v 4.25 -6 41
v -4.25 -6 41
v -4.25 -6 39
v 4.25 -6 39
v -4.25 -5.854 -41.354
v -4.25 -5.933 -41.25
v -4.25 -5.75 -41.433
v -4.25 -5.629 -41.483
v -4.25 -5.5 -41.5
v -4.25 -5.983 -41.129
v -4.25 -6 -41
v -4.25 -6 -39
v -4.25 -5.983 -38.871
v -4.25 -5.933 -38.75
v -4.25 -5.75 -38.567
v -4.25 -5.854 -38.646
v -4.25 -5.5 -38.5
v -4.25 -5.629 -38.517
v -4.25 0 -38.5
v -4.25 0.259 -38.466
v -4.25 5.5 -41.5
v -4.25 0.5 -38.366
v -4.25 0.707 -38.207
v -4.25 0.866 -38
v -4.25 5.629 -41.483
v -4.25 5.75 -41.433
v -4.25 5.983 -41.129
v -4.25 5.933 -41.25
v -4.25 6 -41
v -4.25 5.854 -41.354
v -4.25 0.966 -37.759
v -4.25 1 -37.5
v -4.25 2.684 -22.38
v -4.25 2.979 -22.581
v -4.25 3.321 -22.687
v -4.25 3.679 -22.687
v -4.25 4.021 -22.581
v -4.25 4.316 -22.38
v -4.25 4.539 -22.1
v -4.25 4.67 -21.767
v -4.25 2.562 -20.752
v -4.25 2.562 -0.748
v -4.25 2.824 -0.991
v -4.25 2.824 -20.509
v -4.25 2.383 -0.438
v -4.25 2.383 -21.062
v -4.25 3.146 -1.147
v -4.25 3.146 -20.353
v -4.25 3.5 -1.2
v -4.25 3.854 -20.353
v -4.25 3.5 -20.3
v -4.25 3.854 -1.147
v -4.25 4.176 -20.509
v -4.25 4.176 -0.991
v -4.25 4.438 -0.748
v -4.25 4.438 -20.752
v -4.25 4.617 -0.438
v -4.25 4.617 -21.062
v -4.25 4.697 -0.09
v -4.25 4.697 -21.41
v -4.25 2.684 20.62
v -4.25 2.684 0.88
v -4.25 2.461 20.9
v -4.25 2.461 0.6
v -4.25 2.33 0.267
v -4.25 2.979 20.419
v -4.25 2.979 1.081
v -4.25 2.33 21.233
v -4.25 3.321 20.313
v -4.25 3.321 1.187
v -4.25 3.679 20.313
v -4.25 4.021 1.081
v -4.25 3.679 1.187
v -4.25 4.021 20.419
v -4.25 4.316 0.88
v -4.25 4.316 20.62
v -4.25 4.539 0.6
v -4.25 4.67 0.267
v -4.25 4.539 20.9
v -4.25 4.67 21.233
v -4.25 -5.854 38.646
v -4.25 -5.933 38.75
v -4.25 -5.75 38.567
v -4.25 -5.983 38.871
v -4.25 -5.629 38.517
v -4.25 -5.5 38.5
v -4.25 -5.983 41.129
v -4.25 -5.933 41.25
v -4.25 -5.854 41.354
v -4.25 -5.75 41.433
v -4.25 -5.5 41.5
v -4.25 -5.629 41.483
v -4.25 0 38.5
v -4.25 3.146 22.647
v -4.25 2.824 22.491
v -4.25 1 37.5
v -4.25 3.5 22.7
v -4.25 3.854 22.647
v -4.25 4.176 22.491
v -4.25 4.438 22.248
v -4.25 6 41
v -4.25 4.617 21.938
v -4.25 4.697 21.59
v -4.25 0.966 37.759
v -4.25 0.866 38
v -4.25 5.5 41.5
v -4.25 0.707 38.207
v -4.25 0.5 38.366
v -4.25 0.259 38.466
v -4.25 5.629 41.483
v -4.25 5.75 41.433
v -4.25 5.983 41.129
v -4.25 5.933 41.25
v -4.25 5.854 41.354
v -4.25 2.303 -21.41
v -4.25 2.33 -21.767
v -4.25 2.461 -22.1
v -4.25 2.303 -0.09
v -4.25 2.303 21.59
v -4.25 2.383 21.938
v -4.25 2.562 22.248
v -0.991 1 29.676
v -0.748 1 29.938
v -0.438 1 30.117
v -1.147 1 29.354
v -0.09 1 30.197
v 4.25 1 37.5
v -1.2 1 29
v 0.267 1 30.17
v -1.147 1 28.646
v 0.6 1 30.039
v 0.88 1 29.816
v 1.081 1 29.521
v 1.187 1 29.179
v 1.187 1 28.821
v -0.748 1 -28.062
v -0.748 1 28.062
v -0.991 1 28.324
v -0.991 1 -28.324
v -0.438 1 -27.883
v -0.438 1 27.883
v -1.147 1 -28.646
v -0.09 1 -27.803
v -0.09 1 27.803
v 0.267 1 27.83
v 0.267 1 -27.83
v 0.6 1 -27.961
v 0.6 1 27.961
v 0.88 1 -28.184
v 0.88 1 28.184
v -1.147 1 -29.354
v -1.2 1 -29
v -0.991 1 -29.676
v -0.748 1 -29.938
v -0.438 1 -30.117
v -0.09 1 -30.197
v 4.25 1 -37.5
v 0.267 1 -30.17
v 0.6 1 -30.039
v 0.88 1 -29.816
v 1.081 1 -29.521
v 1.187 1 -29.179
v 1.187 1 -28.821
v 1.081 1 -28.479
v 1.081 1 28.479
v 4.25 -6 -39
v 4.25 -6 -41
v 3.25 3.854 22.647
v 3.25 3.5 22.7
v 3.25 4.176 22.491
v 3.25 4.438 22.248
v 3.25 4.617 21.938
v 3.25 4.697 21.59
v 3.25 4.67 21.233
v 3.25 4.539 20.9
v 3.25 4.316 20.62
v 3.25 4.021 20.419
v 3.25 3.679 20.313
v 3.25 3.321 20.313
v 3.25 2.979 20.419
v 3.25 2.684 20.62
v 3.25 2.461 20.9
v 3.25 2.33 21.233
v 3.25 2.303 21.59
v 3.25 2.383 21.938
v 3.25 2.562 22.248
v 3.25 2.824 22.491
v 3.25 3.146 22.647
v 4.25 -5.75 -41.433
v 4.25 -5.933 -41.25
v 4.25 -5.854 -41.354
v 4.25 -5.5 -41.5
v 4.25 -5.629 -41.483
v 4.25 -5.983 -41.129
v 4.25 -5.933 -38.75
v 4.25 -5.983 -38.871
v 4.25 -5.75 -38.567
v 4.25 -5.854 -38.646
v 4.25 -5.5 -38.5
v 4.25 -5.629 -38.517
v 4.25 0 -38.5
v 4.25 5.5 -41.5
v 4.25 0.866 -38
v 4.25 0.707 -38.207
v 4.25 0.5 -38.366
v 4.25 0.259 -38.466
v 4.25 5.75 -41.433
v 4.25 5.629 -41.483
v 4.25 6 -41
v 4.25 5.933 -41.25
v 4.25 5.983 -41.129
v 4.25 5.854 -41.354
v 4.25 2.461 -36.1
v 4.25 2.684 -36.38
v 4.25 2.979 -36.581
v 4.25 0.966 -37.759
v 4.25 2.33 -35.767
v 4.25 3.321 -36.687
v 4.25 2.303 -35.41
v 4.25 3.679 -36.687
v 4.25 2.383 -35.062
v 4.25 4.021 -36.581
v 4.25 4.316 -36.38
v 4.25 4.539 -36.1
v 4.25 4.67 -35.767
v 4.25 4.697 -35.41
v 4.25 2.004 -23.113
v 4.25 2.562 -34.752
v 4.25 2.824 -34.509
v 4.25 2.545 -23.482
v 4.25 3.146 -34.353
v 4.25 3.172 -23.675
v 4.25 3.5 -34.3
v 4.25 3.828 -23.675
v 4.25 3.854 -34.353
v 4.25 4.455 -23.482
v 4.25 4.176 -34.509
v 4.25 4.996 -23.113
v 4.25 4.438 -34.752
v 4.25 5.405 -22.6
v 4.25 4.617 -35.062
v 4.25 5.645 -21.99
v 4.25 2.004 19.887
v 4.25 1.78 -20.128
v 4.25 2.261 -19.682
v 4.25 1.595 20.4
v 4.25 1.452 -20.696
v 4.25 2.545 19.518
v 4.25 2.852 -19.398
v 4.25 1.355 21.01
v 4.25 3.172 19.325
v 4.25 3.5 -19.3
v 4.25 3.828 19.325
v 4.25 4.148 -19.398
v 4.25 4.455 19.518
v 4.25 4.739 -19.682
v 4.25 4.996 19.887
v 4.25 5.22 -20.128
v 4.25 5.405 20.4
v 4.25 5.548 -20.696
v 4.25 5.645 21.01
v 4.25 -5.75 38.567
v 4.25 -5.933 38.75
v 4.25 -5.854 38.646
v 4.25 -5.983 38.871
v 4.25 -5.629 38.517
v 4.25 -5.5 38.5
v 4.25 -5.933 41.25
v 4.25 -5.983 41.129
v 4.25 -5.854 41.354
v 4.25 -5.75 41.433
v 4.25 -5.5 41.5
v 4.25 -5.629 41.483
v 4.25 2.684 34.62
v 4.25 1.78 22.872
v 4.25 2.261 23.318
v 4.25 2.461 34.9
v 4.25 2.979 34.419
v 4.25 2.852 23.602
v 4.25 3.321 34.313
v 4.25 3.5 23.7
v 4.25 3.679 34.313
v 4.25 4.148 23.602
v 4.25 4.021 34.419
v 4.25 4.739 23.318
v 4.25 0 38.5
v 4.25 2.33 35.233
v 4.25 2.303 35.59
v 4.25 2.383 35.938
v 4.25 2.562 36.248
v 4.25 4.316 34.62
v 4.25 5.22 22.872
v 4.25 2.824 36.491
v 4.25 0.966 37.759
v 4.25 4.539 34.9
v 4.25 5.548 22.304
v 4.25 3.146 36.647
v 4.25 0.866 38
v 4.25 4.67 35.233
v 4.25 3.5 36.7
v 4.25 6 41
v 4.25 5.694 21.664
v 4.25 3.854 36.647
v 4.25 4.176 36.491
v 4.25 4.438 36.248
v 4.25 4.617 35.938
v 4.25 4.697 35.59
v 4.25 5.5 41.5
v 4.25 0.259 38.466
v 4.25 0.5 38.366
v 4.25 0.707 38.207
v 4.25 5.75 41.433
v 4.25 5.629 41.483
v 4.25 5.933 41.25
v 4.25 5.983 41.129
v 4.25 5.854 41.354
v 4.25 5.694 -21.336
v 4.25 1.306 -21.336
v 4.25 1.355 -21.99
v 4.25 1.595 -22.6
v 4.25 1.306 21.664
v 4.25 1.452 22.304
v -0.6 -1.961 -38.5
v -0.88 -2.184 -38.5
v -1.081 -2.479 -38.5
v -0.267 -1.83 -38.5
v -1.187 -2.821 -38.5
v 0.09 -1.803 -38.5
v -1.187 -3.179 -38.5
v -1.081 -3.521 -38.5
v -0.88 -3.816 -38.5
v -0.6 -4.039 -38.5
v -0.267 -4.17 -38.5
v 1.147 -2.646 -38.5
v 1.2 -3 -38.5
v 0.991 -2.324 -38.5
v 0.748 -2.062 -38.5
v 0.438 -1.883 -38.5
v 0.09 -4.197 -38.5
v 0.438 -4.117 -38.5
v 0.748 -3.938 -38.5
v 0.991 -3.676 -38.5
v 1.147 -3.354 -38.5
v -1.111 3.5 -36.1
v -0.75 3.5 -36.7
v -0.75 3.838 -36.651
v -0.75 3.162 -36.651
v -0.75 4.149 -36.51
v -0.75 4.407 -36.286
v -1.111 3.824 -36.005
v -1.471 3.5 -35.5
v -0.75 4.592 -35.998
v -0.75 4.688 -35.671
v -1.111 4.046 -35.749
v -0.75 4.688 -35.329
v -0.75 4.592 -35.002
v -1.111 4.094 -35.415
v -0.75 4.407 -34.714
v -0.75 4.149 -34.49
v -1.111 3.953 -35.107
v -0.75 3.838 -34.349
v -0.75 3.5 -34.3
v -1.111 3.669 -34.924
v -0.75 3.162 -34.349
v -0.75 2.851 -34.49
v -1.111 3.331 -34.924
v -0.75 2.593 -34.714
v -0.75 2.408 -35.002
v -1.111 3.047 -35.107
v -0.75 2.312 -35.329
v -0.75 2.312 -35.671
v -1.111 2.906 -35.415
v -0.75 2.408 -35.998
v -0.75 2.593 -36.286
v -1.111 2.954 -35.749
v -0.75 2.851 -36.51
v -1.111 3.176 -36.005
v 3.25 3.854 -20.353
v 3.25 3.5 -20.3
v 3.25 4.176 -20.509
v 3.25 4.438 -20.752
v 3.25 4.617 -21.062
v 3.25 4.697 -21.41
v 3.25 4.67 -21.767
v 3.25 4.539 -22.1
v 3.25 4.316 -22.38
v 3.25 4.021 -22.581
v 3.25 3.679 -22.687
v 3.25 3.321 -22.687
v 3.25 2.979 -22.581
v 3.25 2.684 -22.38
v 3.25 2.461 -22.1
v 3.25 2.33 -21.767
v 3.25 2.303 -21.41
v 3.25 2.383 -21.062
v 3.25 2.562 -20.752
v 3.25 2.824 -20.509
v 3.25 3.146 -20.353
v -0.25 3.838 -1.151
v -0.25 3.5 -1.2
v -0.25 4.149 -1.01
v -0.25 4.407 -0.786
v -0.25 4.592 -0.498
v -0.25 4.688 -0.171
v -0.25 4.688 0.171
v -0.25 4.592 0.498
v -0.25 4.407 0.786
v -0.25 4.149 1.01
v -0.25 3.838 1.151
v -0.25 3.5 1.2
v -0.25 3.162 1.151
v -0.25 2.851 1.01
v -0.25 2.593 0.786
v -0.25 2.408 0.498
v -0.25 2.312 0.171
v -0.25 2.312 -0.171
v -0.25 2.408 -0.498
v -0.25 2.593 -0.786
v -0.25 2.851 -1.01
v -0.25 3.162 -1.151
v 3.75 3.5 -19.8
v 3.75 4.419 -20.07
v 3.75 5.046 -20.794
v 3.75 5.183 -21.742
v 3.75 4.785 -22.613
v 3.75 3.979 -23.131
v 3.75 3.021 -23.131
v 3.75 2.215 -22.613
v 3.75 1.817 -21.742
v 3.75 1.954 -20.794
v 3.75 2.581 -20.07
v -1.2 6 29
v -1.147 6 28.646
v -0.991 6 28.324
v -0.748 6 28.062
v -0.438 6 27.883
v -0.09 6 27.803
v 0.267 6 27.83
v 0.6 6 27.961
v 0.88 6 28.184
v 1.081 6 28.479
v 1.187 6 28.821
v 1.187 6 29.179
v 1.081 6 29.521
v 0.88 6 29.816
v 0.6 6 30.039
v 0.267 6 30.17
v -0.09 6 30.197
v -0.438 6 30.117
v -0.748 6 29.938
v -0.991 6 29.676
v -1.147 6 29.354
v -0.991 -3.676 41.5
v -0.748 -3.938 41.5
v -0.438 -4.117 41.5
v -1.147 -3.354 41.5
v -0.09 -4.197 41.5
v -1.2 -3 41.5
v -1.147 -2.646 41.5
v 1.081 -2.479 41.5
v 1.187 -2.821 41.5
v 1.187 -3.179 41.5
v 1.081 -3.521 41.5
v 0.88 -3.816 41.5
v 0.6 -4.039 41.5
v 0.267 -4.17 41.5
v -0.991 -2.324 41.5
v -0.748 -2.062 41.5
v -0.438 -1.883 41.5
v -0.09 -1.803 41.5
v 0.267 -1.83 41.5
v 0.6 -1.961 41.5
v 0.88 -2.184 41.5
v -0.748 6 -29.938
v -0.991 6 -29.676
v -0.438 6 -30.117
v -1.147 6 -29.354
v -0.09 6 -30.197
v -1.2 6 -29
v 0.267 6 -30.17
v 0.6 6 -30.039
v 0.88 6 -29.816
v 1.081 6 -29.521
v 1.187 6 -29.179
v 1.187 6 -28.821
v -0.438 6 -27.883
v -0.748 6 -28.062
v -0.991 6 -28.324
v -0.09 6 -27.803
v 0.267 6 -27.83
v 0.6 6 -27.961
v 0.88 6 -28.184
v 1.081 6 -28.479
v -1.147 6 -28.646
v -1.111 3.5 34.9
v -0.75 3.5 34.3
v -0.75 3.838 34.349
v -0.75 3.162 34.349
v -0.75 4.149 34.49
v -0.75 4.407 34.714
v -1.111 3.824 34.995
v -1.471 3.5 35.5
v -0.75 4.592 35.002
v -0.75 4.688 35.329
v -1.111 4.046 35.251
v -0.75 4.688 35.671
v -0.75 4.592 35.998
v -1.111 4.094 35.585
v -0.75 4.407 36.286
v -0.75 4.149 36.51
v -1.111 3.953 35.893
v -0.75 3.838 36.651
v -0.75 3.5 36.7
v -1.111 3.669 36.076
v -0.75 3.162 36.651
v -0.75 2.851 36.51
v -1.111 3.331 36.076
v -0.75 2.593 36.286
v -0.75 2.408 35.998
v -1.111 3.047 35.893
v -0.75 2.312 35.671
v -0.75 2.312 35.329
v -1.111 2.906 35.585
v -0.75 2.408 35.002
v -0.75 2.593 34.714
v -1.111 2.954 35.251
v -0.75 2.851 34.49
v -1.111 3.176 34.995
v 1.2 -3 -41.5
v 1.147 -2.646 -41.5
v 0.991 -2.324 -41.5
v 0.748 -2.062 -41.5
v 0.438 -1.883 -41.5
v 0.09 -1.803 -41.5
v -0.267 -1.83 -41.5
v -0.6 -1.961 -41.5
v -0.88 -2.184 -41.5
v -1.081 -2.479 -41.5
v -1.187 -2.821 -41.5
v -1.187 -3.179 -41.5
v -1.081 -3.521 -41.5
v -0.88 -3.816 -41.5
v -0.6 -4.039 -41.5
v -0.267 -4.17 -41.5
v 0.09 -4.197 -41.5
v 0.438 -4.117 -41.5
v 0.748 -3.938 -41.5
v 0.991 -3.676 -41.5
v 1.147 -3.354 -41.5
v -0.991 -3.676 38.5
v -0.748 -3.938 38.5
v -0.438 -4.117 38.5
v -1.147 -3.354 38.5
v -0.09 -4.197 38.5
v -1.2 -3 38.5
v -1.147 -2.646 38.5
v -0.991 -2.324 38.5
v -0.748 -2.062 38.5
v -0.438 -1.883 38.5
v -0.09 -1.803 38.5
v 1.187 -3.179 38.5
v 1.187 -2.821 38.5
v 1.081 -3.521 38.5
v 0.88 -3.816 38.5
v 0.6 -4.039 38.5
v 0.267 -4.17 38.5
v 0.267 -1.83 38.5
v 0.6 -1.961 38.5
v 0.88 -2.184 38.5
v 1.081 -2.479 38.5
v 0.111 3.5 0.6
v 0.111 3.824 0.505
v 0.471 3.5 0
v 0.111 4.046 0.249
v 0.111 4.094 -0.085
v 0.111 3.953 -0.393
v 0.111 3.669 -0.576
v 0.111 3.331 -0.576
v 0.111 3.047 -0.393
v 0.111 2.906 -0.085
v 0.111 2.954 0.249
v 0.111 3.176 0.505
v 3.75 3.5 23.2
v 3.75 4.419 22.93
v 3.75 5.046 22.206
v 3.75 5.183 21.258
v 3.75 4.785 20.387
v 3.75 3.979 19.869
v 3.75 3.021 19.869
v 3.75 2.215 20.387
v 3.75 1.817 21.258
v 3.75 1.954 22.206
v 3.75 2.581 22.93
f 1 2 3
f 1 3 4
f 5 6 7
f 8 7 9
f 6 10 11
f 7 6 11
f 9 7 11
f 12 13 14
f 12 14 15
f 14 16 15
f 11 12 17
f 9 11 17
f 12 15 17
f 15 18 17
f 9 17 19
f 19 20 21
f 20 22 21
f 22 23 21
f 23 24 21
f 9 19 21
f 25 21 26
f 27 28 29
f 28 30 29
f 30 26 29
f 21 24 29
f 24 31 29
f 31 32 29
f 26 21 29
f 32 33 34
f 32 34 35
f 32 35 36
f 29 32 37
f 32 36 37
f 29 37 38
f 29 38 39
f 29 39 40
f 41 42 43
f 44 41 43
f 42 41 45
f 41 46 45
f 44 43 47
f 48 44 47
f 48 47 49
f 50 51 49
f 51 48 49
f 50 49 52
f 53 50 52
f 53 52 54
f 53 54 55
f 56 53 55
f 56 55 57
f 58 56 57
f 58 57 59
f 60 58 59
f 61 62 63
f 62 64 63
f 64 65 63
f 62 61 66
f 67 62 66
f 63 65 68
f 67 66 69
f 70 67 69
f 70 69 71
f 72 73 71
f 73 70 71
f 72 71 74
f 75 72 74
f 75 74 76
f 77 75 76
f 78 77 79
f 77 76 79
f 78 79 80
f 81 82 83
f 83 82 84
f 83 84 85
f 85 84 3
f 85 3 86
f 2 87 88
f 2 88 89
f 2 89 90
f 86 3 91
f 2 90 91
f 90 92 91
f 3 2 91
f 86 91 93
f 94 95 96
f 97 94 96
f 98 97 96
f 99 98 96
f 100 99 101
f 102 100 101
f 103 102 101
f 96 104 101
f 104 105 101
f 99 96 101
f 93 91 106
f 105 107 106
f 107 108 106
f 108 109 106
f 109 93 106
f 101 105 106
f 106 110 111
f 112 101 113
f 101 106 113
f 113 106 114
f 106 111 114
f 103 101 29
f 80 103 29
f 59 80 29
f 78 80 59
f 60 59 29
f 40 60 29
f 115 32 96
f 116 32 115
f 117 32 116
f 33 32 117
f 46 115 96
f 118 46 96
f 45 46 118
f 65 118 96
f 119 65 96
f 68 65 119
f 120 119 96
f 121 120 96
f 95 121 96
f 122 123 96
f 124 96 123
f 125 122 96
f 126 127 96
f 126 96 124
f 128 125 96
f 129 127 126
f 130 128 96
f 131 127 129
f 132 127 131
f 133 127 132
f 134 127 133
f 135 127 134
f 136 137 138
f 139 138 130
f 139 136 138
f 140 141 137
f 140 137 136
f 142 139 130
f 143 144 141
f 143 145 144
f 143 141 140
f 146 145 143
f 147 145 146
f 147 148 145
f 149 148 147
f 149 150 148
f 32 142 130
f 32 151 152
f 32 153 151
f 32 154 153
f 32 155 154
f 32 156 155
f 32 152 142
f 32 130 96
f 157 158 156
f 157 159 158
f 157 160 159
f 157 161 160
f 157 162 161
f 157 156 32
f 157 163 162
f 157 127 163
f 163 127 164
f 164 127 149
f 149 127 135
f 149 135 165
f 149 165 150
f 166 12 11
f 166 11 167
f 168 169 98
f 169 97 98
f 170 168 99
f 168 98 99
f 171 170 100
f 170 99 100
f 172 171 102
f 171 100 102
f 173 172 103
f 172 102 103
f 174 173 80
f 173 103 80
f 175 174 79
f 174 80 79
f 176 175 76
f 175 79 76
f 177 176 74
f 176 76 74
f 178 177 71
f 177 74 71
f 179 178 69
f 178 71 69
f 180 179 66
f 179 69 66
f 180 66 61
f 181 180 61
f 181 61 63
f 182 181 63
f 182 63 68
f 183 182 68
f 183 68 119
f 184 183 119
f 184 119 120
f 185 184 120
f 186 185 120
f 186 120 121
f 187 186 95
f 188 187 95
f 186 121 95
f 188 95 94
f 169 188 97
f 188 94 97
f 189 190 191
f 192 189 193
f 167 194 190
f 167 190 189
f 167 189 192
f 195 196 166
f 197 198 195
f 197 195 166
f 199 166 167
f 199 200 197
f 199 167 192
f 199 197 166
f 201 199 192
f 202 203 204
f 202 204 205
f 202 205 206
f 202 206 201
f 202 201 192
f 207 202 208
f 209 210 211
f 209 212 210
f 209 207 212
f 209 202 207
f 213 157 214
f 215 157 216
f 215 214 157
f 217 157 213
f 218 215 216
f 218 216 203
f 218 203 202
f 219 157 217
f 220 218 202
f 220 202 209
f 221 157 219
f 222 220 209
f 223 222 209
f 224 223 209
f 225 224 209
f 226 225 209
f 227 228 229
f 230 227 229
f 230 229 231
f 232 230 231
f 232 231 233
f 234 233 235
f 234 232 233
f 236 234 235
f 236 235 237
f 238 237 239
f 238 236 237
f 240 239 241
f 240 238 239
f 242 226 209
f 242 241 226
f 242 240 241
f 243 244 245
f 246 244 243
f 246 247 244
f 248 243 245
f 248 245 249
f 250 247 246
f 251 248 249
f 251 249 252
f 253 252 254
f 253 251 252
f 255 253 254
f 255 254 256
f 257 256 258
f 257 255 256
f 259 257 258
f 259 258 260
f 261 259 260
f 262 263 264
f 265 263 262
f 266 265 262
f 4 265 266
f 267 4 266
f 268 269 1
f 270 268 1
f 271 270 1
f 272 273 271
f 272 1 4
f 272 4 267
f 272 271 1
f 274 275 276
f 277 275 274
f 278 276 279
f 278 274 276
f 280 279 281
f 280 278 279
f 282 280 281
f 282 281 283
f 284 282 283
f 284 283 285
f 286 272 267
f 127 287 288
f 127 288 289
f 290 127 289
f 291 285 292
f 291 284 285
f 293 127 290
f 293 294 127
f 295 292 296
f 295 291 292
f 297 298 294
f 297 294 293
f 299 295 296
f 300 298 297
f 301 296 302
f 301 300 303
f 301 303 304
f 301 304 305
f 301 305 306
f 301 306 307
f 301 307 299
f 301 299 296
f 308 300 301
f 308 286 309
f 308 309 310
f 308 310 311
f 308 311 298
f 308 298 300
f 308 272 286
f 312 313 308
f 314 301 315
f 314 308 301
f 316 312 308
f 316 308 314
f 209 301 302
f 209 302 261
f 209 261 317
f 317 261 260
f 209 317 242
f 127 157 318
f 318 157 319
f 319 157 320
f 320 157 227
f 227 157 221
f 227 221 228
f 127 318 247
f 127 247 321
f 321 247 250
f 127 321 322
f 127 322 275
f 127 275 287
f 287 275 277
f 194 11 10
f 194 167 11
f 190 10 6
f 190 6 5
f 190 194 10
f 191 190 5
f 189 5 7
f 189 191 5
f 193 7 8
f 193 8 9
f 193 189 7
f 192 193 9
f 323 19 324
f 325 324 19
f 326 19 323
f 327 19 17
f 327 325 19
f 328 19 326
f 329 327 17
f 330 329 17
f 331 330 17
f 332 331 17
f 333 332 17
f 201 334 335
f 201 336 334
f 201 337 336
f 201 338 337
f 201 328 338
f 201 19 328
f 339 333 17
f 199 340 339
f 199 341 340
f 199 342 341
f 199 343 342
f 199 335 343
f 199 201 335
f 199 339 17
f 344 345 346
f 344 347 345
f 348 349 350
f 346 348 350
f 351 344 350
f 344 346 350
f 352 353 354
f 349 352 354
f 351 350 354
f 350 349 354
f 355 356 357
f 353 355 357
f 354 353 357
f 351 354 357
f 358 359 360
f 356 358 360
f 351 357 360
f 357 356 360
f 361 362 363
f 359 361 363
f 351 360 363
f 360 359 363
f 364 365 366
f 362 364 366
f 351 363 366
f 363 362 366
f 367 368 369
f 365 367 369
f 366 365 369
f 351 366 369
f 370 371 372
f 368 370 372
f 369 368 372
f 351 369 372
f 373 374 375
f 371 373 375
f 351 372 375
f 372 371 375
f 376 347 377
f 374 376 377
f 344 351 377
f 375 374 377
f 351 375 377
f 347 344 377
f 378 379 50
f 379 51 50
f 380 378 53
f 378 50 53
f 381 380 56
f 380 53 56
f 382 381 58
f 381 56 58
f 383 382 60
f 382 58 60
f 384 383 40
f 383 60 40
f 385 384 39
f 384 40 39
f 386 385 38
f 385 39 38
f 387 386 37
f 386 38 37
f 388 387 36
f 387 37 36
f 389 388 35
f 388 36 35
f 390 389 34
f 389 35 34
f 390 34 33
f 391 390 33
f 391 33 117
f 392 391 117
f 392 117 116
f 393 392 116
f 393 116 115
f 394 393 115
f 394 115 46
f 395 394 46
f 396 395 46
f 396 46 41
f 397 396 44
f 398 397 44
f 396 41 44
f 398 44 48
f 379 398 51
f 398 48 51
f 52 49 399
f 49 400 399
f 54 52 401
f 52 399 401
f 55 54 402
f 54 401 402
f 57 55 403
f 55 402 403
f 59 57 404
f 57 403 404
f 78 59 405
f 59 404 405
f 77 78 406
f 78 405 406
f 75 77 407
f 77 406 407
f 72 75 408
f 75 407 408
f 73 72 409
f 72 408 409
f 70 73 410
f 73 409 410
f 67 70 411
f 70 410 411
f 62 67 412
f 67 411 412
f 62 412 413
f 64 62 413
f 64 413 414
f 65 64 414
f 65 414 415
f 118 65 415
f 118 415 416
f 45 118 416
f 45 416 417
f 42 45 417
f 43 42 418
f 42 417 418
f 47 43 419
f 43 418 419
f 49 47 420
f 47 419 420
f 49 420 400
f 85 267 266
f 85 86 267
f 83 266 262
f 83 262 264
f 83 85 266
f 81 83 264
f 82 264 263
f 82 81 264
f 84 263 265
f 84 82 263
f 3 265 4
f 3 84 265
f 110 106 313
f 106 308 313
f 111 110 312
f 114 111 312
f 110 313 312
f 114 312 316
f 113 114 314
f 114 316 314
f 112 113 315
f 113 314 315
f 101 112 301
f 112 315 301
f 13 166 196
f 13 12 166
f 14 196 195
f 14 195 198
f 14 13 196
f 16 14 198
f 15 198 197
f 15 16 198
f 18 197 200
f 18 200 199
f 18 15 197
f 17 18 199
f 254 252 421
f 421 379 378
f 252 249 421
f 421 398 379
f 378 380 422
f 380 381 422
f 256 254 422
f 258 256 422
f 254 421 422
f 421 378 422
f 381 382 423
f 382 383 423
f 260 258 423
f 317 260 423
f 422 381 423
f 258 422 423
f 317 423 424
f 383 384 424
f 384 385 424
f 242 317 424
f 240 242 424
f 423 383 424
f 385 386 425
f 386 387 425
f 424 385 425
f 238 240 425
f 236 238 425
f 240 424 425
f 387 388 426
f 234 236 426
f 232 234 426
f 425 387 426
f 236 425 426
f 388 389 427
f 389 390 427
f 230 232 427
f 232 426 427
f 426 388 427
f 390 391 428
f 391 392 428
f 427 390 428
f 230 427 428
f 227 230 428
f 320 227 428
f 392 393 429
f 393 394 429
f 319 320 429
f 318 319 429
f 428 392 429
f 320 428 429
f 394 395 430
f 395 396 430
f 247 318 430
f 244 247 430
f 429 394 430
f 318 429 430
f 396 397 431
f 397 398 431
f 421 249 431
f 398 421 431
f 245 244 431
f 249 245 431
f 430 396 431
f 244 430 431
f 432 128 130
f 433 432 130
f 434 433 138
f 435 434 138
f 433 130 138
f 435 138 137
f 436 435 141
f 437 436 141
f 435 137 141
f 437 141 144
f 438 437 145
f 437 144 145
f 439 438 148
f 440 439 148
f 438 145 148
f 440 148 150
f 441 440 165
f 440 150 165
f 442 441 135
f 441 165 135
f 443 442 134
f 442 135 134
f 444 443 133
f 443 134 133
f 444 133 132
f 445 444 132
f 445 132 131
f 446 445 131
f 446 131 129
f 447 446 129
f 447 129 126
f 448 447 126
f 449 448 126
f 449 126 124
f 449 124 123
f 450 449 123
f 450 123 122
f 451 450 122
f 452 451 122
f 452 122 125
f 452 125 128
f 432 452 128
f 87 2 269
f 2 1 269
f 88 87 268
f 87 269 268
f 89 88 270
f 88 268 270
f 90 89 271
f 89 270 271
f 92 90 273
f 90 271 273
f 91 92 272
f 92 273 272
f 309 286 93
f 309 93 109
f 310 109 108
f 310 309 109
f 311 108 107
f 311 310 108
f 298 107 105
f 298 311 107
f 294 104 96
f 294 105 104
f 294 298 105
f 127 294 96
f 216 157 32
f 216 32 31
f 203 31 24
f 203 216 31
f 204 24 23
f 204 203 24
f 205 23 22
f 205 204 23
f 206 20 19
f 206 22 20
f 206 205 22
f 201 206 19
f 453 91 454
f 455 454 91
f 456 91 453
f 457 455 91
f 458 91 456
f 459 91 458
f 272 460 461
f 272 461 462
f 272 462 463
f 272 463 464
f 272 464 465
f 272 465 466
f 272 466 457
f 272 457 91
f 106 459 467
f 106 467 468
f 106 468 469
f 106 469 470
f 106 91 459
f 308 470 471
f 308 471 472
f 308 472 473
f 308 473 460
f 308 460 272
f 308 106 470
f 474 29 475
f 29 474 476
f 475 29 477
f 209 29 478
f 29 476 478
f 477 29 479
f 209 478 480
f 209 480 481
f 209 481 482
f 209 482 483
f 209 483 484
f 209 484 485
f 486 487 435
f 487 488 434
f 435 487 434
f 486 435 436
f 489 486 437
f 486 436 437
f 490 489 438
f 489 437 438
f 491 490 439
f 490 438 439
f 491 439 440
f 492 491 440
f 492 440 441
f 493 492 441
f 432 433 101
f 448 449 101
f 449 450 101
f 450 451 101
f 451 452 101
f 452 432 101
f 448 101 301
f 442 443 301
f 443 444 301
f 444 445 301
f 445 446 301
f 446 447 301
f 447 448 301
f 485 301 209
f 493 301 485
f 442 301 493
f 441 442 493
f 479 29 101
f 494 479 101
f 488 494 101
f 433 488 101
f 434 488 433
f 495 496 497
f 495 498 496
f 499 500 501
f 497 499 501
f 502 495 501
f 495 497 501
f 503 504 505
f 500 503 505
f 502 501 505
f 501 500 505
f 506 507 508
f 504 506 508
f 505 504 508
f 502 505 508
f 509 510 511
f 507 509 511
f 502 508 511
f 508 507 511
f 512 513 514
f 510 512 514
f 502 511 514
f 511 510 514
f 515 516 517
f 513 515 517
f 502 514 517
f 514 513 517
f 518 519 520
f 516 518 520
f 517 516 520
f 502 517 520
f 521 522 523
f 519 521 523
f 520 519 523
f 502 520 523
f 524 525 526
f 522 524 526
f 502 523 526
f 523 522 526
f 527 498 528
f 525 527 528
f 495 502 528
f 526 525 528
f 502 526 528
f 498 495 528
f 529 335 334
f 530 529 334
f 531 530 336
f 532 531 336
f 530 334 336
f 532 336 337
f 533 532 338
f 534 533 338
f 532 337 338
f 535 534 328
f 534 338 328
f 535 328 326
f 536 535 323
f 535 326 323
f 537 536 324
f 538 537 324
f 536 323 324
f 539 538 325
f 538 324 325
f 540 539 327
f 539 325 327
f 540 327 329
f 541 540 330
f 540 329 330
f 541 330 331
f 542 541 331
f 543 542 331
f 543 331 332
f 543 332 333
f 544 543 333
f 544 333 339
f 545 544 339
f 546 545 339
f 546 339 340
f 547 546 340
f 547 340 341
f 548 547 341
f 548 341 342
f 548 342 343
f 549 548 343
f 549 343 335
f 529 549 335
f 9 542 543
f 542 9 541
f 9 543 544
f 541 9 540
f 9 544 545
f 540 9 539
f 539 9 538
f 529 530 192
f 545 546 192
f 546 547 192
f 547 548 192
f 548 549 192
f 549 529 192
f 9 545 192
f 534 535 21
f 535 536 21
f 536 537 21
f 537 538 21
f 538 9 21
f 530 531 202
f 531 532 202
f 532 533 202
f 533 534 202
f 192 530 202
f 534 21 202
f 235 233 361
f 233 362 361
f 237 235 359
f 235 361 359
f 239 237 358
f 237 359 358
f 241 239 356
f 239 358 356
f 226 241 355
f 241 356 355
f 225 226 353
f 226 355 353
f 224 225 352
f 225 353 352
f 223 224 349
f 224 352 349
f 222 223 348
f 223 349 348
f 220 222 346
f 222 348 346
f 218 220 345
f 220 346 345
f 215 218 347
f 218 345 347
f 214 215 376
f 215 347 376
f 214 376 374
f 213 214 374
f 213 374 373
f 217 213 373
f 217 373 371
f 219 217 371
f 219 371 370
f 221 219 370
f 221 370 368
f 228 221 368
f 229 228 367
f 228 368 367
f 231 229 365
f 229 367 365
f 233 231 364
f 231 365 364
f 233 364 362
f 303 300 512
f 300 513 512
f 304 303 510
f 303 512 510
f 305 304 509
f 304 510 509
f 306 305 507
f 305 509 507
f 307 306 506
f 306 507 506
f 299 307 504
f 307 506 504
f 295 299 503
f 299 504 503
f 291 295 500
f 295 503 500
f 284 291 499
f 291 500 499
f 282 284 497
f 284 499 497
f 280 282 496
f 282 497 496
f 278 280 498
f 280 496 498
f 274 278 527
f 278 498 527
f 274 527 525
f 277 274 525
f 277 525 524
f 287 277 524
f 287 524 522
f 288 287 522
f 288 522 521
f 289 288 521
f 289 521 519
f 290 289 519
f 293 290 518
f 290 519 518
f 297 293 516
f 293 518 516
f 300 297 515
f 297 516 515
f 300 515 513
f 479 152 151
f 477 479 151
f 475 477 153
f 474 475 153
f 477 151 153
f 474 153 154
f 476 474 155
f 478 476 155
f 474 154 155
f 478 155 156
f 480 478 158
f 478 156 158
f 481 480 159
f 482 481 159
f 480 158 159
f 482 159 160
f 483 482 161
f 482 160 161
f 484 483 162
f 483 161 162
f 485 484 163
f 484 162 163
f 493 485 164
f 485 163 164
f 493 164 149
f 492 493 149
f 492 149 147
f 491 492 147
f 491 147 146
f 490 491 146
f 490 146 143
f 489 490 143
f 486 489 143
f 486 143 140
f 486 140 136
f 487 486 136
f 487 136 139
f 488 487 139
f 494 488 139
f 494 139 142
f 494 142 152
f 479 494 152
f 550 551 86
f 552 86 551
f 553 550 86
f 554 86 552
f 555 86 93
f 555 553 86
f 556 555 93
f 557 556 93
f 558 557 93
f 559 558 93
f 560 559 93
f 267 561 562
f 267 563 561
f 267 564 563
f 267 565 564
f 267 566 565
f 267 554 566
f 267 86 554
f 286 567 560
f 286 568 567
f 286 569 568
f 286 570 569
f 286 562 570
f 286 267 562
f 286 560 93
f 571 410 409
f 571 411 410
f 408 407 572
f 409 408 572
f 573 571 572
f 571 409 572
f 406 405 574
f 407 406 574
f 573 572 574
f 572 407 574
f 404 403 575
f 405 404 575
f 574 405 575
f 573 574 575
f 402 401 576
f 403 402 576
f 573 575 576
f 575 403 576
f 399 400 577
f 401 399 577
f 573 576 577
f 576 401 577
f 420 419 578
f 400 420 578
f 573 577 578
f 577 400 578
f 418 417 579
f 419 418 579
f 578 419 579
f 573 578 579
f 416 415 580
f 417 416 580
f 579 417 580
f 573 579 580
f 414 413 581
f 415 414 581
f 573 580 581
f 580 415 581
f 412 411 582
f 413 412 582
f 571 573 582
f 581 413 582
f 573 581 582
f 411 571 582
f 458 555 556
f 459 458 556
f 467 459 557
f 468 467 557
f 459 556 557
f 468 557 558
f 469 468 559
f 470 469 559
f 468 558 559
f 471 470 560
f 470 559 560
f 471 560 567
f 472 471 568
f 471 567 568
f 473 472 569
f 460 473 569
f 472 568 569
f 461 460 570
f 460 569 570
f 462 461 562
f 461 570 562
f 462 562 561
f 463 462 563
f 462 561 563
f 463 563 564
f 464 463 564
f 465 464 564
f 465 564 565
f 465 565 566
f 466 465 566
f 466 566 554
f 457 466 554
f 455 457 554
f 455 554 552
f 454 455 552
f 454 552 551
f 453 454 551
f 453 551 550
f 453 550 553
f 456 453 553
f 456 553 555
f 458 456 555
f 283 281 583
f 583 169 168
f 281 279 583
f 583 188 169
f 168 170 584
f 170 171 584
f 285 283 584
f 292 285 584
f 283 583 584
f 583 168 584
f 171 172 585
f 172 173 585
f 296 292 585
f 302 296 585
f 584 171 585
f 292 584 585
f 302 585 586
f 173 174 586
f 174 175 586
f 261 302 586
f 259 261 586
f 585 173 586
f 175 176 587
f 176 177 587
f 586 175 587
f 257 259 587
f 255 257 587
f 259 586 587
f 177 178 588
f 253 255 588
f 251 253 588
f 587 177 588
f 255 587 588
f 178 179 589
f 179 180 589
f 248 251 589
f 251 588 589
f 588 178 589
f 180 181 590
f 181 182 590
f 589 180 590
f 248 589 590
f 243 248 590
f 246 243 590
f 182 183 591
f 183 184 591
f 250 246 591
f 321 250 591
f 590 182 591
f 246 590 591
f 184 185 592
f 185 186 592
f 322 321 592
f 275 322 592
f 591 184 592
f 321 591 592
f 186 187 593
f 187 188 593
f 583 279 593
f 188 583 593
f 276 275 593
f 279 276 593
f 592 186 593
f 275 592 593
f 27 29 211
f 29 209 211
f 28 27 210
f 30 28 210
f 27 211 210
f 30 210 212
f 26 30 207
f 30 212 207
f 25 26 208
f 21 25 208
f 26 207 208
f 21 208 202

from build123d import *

# Parameters (mm, degrees)
SKETCH1_W              = 8.5
SKETCH1_H              = 12
BOSS_EXTRUDE1_DEPTH    = 41.5
CUT_EXTRUDE1_DEPTH     = 43.784342931
FILLET1_R              = 0.5
M2_HOLE1_J_D           = 2.4
M2_HOLE1_J_DEPTH       = 5
M2_HOLE1_J_TIP         = 0.721032743
M2_HOLE2_K_D           = 2.4
M2_HOLE2_K_CSINK_D     = 4.4
M2_HOLE2_K_CSINK_ANGLE = 90
M2_HOLE3_L_D           = 2.4
M2_HOLE3_L_DEPTH       = 10
M2_HOLE3_L_TIP         = 0.721032743
M2_HOLE4_M_D           = 2.4
M2_HOLE5_N_D           = 2.4
M2_HOLE5_N_DEPTH       = 4
M2_HOLE5_N_TIP         = 0.721032743
M2_HOLE6_P_D           = 2.4
M2_HOLE6_P_DEPTH       = 10
M2_HOLE6_P_TIP         = 0.721032743


with BuildPart() as part:
    # Sketch1 → Boss-Extrude1 (new, symmetric)
    with BuildSketch(Plane.XY):
        Rectangle(SKETCH1_W, SKETCH1_H)
    extrude(amount=BOSS_EXTRUDE1_DEPTH, both=True)

    # Sketch2 → Cut-Extrude1 (cut, through all)
    with BuildSketch(Plane(origin=(4.25, 0, 0), x_dir=(0, 0, -1), z_dir=(1, 0, 0))):
        with BuildLine():
            Line((-37.5, 1), (37.5, 1))
            ThreePointArc((37.5, 1), (38.207106781, 0.707106781), (38.5, 0))
            Line((38.5, 0), (38.5, -6))
            Line((38.5, -6), (-38.5, -6))
            Line((-38.5, -6), (-38.5, 0))
            ThreePointArc((-38.5, 0), (-38.207106781, 0.707106781), (-37.5, 1))
        make_face()
    extrude(amount=-CUT_EXTRUDE1_DEPTH, mode=Mode.SUBTRACT)

    # Fillet1
    fillet1_edges = [part.edges().sort_by_distance(p)[0] for p in [
        (0, -6, 41.5),
        (0, -6, -38.5),
        (0, -6, 38.5),
        (0, -6, -41.5),
        (0, 6, -41.5),
        (0, 6, 41.5),
    ]]
    fillet(fillet1_edges, radius=FILLET1_R)

    # M2 Hole1 - J
    with Locations(Plane(origin=(4.25, 0, 0), x_dir=(0, 0, -1), z_dir=(1, 0, 0))):
        with Locations((-35.5, 3.5), (35.5, 3.5)):
            Hole(M2_HOLE1_J_D / 2, depth=M2_HOLE1_J_DEPTH)
            with Locations((0, 0, -(M2_HOLE1_J_DEPTH + M2_HOLE1_J_TIP / 2))):  # 118° drill point
                Cone(0, M2_HOLE1_J_D / 2, M2_HOLE1_J_TIP, mode=Mode.SUBTRACT)

    # M2 Hole2 - K (through all)
    with Locations(Plane(origin=(4.25, 0, 0), x_dir=(0, 0, -1), z_dir=(1, 0, 0))):
        with Locations((-21.5, 3.5), (21.5, 3.5)):
            CounterSinkHole(M2_HOLE2_K_D / 2, M2_HOLE2_K_CSINK_D / 2, counter_sink_angle=M2_HOLE2_K_CSINK_ANGLE)

    # M2 Hole3 - L
    with Locations(Plane.XY.offset(41.5)):
        with Locations((0, -3)):
            Hole(M2_HOLE3_L_D / 2, depth=M2_HOLE3_L_DEPTH)
            with Locations((0, 0, -(M2_HOLE3_L_DEPTH + M2_HOLE3_L_TIP / 2))):  # 118° drill point
                Cone(0, M2_HOLE3_L_D / 2, M2_HOLE3_L_TIP, mode=Mode.SUBTRACT)

    # M2 Hole4 - M (through all)
    with Locations(Plane(origin=(0, 6, 0), x_dir=(1, 0, 0), z_dir=(0, 1, 0))):
        with Locations((0, 29), (0, -29)):
            Hole(M2_HOLE4_M_D / 2)

    # M2 Hole5 - N
    with Locations(Plane.ZY.offset(4.25)):
        with Locations((0, 3.5)):
            Hole(M2_HOLE5_N_D / 2, depth=M2_HOLE5_N_DEPTH)
            with Locations((0, 0, -(M2_HOLE5_N_DEPTH + M2_HOLE5_N_TIP / 2))):  # 118° drill point
                Cone(0, M2_HOLE5_N_D / 2, M2_HOLE5_N_TIP, mode=Mode.SUBTRACT)

    # M2 Hole6 - P
    with Locations(Plane(origin=(0, 0, -41.5), x_dir=(-1, 0, 0), z_dir=(0, 0, -1))):
        with Locations((0, -3)):
            Hole(M2_HOLE6_P_D / 2, depth=M2_HOLE6_P_DEPTH)
            with Locations((0, 0, -(M2_HOLE6_P_DEPTH + M2_HOLE6_P_TIP / 2))):  # 118° drill point
                Cone(0, M2_HOLE6_P_D / 2, M2_HOLE6_P_TIP, mode=Mode.SUBTRACT)


solid = part.part
